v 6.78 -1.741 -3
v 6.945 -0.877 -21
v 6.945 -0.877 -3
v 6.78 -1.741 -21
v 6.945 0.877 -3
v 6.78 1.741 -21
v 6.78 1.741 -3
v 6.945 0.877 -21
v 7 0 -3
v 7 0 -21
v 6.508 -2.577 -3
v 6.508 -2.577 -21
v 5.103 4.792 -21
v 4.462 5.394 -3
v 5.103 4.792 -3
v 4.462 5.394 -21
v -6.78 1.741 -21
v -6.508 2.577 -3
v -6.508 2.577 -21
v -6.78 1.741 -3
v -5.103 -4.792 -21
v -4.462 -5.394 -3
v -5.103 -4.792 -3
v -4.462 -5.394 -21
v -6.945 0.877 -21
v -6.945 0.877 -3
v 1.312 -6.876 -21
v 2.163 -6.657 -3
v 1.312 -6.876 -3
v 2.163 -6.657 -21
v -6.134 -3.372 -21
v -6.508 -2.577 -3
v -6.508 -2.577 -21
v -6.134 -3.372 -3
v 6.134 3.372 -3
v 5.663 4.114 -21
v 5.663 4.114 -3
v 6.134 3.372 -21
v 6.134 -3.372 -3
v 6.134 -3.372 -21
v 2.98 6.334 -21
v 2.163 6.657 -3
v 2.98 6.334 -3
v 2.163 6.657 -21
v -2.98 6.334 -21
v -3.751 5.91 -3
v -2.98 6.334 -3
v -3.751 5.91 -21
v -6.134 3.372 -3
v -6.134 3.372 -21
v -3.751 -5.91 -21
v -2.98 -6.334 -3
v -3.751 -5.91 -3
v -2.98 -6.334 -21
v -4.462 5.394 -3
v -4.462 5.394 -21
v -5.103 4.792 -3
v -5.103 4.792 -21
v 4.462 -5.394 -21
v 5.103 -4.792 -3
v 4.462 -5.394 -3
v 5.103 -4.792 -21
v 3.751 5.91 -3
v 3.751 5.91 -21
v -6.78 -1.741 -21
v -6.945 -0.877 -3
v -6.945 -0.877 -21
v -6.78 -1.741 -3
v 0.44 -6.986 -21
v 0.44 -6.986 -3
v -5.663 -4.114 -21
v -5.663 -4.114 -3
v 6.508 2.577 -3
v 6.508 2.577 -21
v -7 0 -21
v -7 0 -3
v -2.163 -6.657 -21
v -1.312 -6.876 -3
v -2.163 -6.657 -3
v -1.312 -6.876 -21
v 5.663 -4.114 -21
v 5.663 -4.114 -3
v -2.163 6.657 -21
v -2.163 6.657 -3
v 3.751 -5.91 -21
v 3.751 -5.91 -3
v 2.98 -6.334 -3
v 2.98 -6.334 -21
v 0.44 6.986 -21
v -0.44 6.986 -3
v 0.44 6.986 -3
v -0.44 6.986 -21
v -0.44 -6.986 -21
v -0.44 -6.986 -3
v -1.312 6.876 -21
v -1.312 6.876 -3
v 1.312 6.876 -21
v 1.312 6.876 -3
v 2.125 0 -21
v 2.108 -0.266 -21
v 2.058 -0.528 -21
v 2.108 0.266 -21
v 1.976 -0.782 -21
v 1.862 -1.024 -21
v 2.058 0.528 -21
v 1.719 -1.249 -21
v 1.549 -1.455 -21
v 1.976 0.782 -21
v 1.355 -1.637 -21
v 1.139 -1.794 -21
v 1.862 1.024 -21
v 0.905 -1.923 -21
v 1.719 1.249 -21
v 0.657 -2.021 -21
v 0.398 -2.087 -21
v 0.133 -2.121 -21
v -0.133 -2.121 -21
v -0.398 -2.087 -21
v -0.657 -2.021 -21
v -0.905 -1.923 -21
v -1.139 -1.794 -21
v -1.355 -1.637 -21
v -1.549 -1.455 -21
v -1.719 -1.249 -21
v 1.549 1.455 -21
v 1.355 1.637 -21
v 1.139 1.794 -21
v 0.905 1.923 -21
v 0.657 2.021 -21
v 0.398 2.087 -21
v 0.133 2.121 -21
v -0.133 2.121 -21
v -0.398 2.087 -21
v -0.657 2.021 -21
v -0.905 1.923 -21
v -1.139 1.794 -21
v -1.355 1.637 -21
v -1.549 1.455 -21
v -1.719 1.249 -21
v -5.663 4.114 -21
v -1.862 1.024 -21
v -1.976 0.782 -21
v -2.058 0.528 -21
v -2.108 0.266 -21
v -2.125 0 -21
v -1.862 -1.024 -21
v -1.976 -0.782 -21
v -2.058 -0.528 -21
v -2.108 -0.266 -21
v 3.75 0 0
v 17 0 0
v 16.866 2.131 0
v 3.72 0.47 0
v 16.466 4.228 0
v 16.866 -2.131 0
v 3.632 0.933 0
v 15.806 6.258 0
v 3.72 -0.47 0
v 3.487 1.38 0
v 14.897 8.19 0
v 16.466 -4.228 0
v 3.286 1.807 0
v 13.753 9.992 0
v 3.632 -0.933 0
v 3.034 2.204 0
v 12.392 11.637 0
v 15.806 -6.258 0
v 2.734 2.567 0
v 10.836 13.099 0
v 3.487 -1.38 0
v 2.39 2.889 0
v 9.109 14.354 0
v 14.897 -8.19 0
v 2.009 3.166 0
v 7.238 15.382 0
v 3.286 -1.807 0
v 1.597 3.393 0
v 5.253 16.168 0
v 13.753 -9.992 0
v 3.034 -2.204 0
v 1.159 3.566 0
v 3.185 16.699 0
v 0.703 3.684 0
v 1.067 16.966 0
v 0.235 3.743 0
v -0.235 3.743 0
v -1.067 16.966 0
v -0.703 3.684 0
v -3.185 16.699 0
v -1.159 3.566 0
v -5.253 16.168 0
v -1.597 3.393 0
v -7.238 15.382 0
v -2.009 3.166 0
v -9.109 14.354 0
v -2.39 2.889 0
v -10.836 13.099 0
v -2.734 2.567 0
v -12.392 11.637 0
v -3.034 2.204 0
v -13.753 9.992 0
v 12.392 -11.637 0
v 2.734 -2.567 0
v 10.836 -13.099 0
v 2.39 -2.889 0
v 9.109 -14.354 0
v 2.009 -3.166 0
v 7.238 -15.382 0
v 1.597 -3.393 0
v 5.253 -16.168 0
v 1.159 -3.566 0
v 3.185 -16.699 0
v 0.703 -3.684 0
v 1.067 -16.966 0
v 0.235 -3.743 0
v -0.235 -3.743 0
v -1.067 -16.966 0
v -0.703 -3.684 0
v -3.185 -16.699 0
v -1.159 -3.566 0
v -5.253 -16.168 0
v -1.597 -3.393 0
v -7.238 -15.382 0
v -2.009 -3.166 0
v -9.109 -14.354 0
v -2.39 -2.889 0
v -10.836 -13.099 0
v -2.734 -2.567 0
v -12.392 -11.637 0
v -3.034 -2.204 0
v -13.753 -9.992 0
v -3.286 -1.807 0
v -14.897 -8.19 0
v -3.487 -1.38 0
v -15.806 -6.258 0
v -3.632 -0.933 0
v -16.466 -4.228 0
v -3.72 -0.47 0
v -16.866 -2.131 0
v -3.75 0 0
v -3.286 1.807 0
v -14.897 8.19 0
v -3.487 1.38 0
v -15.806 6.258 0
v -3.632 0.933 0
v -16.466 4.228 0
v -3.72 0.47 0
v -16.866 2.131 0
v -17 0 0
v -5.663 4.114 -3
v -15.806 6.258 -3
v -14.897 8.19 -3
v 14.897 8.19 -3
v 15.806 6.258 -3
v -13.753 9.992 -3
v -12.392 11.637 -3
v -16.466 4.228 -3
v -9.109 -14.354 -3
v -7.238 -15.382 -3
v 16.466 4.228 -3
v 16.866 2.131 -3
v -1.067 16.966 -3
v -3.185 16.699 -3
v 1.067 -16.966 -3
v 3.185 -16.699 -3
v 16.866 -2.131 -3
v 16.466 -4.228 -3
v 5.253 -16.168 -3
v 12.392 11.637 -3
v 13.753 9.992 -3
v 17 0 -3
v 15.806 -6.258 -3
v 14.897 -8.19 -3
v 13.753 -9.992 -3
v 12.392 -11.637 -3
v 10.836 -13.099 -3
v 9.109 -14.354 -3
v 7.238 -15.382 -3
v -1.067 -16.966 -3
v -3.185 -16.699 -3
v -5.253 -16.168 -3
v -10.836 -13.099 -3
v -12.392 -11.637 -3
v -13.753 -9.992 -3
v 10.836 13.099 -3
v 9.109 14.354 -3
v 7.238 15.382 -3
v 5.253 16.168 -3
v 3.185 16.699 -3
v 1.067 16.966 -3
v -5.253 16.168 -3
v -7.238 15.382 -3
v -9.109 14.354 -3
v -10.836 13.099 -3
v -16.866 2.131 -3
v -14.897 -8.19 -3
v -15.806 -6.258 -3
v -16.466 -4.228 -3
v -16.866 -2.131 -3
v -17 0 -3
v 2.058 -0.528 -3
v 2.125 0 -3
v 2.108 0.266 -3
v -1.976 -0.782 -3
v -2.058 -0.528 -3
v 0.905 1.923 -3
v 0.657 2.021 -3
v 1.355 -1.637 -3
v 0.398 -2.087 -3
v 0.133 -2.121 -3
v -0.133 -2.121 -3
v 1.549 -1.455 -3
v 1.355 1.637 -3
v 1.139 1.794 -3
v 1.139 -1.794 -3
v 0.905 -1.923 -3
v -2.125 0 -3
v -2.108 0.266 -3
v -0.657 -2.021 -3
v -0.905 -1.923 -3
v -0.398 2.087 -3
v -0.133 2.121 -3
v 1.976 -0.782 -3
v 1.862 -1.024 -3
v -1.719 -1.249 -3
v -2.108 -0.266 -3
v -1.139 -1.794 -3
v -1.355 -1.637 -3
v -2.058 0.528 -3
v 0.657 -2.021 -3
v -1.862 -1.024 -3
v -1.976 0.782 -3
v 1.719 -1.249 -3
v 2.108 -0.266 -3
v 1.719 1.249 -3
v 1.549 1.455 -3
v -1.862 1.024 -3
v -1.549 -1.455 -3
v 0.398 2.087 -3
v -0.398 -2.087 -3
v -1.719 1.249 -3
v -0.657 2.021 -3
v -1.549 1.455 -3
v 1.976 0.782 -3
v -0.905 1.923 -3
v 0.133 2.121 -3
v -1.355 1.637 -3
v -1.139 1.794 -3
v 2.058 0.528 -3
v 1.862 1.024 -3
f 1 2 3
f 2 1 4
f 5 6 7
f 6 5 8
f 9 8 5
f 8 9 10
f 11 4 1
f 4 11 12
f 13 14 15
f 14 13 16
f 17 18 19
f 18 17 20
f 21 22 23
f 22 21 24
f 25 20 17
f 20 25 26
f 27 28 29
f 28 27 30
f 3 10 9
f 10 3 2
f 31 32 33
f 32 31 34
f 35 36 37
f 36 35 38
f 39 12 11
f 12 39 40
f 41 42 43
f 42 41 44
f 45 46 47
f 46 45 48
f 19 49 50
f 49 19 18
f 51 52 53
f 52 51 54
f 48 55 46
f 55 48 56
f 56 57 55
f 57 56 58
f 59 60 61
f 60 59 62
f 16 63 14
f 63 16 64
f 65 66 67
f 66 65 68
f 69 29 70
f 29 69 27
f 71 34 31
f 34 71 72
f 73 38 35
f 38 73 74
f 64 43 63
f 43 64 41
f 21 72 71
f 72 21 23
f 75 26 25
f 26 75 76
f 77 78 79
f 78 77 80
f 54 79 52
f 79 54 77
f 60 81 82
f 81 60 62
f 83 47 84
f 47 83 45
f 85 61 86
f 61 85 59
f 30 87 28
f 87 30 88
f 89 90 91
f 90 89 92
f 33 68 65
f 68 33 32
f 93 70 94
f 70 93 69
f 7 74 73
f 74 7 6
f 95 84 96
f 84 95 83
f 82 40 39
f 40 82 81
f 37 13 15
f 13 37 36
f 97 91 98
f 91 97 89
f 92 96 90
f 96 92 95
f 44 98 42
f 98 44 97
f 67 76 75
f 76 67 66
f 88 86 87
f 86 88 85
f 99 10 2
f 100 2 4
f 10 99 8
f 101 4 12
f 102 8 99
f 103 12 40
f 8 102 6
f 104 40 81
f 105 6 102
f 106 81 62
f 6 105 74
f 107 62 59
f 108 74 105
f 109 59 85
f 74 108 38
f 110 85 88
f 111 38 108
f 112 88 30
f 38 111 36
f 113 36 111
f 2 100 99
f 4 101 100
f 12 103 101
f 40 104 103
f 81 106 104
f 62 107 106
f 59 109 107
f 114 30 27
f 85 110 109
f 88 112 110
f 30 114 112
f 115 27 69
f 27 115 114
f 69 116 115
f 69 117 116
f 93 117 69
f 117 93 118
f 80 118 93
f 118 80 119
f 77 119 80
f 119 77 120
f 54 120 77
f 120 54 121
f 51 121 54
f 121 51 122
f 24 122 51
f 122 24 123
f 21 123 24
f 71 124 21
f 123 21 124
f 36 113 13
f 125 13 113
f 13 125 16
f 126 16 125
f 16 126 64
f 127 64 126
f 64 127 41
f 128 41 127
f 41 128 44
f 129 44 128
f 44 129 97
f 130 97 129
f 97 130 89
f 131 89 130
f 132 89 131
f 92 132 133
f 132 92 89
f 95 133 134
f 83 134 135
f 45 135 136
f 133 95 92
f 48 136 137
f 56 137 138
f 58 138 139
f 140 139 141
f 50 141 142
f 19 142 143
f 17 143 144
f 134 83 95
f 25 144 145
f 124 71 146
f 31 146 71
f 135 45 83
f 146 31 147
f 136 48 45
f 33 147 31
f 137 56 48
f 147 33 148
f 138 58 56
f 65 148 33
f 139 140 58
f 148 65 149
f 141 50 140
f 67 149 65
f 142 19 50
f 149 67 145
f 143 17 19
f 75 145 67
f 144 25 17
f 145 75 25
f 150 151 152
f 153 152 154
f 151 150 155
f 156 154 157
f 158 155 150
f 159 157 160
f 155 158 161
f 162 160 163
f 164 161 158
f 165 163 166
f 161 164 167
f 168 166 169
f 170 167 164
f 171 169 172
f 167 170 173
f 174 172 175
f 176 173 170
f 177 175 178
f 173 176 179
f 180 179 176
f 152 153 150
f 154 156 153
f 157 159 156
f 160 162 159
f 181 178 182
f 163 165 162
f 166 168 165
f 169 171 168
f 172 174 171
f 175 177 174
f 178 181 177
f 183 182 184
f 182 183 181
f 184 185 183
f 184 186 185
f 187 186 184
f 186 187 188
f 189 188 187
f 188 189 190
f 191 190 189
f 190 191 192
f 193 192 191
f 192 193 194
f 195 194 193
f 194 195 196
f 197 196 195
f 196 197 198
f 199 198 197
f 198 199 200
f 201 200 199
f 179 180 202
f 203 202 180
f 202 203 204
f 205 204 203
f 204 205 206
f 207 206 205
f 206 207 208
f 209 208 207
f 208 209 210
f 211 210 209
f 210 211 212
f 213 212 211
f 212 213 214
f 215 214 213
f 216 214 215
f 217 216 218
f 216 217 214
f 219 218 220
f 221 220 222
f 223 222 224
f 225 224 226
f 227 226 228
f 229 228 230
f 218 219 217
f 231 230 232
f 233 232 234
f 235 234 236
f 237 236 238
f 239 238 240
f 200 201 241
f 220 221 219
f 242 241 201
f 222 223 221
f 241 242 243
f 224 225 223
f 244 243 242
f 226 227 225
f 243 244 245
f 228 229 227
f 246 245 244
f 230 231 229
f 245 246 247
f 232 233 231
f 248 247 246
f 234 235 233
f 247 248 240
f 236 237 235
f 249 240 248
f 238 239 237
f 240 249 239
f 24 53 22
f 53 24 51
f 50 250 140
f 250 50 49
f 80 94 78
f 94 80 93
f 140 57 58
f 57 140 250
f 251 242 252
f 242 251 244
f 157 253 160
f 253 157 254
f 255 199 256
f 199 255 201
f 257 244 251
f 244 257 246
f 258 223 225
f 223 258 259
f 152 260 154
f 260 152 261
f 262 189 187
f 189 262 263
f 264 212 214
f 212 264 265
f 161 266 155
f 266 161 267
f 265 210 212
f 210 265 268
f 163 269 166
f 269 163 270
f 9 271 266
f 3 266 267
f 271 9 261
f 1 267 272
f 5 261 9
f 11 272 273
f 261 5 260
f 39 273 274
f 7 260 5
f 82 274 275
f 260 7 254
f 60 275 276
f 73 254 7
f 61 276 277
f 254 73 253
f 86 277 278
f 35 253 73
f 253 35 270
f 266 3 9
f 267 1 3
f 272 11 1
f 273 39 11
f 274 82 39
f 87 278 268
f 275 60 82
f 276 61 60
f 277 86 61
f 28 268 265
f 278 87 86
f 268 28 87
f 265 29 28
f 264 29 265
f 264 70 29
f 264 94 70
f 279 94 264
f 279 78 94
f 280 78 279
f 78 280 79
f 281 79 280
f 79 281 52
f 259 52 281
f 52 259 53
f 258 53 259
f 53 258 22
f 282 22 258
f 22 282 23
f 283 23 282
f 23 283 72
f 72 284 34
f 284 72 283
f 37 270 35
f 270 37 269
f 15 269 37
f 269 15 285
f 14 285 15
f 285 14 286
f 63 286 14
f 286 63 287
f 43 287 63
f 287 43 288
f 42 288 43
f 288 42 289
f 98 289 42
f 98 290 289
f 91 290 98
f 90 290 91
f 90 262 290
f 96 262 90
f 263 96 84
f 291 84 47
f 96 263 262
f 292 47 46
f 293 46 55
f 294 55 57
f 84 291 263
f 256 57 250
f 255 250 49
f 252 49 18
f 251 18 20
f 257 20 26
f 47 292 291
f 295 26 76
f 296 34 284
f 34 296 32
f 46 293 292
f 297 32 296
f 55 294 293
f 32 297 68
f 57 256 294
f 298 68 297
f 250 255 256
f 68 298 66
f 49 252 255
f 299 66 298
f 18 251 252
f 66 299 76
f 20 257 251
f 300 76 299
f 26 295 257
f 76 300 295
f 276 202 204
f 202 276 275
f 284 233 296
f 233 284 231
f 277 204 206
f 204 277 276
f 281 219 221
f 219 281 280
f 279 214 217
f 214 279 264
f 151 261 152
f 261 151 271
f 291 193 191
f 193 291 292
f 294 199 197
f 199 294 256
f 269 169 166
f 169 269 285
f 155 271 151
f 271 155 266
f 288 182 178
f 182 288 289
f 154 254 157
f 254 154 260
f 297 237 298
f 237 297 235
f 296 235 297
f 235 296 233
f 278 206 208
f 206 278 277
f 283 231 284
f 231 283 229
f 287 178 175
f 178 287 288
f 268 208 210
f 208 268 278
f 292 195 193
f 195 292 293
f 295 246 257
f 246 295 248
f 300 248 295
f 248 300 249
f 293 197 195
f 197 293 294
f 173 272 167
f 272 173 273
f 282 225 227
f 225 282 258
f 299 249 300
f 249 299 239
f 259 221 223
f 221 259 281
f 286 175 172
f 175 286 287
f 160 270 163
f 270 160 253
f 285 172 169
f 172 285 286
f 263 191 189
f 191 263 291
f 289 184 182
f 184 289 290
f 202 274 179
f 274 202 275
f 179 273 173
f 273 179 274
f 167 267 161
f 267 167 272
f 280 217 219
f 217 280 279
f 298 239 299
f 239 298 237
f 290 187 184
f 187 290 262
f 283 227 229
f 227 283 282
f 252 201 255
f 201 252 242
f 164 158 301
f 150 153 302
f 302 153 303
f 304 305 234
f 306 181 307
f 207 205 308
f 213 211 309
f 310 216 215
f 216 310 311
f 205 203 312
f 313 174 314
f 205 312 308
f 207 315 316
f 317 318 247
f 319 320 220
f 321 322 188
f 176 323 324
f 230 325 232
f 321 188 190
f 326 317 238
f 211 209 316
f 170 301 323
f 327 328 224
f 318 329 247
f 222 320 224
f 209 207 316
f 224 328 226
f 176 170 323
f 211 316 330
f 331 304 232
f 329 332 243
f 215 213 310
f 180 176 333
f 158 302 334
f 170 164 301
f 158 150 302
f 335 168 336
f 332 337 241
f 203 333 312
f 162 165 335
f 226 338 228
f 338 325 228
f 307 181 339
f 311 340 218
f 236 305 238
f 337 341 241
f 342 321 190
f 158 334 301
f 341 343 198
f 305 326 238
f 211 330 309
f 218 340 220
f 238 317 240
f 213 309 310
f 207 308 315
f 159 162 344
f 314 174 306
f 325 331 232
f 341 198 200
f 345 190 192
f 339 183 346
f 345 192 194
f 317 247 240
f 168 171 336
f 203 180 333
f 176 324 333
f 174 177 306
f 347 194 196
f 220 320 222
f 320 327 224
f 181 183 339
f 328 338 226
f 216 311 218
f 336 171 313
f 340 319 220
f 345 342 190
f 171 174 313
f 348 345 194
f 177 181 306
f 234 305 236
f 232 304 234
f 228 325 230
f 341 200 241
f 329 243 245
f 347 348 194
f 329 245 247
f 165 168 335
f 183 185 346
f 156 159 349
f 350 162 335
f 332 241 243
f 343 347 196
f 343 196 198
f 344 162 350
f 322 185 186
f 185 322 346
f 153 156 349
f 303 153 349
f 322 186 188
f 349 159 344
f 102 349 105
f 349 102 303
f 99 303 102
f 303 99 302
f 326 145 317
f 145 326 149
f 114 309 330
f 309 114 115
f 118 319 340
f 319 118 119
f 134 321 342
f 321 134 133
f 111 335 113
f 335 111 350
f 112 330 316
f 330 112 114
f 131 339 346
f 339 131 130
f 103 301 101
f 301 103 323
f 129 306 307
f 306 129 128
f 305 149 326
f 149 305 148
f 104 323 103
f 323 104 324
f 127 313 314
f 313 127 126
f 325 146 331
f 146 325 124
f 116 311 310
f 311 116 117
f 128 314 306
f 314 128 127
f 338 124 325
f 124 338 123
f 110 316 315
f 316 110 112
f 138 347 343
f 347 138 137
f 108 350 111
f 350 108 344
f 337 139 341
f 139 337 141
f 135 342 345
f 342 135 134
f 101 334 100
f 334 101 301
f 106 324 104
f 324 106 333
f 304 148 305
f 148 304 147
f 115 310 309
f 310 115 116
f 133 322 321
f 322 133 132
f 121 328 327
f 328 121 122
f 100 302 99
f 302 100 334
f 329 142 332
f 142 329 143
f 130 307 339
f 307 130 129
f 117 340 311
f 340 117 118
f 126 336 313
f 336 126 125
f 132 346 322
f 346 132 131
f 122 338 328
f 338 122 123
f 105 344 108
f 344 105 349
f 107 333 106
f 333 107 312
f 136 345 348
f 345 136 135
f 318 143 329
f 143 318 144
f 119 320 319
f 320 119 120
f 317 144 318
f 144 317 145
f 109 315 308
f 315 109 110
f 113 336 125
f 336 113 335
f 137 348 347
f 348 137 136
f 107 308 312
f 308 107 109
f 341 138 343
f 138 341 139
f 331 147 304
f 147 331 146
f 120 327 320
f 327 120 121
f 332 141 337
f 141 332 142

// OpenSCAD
$fn = 50;


difference() {
	union() {
		translate(v = [0, 0, -21.0000000000]) {
			cylinder(h = 21, r = 7.0000000000);
		}
		translate(v = [0, 0, -3.0000000000]) {
			cylinder(h = 3, r = 17.0000000000);
		}
	}
	union() {
		translate(v = [0, 0, 0]) {
			rotate(a = [0, 0, 0]) {
				difference() {
					union() {
						#translate(v = [0, 0, -21.0000000000]) {
							cylinder(h = 21, r = 2.0000000000);
						}
						#translate(v = [0, 0, -3]) {
							cylinder(h = 3, r = 7.0000000000, r1 = 2.1250000000, r2 = 3.7500000000);
						}
						#translate(v = [0, 0, -21.0000000000]) {
							cylinder(h = 21, r = 2.1250000000);
						}
						#translate(v = [0, 0, -21.0000000000]) {
							cylinder(h = 21, r = 2.0000000000);
						}
					}
					union();
				}
			}
		}
	}
}
